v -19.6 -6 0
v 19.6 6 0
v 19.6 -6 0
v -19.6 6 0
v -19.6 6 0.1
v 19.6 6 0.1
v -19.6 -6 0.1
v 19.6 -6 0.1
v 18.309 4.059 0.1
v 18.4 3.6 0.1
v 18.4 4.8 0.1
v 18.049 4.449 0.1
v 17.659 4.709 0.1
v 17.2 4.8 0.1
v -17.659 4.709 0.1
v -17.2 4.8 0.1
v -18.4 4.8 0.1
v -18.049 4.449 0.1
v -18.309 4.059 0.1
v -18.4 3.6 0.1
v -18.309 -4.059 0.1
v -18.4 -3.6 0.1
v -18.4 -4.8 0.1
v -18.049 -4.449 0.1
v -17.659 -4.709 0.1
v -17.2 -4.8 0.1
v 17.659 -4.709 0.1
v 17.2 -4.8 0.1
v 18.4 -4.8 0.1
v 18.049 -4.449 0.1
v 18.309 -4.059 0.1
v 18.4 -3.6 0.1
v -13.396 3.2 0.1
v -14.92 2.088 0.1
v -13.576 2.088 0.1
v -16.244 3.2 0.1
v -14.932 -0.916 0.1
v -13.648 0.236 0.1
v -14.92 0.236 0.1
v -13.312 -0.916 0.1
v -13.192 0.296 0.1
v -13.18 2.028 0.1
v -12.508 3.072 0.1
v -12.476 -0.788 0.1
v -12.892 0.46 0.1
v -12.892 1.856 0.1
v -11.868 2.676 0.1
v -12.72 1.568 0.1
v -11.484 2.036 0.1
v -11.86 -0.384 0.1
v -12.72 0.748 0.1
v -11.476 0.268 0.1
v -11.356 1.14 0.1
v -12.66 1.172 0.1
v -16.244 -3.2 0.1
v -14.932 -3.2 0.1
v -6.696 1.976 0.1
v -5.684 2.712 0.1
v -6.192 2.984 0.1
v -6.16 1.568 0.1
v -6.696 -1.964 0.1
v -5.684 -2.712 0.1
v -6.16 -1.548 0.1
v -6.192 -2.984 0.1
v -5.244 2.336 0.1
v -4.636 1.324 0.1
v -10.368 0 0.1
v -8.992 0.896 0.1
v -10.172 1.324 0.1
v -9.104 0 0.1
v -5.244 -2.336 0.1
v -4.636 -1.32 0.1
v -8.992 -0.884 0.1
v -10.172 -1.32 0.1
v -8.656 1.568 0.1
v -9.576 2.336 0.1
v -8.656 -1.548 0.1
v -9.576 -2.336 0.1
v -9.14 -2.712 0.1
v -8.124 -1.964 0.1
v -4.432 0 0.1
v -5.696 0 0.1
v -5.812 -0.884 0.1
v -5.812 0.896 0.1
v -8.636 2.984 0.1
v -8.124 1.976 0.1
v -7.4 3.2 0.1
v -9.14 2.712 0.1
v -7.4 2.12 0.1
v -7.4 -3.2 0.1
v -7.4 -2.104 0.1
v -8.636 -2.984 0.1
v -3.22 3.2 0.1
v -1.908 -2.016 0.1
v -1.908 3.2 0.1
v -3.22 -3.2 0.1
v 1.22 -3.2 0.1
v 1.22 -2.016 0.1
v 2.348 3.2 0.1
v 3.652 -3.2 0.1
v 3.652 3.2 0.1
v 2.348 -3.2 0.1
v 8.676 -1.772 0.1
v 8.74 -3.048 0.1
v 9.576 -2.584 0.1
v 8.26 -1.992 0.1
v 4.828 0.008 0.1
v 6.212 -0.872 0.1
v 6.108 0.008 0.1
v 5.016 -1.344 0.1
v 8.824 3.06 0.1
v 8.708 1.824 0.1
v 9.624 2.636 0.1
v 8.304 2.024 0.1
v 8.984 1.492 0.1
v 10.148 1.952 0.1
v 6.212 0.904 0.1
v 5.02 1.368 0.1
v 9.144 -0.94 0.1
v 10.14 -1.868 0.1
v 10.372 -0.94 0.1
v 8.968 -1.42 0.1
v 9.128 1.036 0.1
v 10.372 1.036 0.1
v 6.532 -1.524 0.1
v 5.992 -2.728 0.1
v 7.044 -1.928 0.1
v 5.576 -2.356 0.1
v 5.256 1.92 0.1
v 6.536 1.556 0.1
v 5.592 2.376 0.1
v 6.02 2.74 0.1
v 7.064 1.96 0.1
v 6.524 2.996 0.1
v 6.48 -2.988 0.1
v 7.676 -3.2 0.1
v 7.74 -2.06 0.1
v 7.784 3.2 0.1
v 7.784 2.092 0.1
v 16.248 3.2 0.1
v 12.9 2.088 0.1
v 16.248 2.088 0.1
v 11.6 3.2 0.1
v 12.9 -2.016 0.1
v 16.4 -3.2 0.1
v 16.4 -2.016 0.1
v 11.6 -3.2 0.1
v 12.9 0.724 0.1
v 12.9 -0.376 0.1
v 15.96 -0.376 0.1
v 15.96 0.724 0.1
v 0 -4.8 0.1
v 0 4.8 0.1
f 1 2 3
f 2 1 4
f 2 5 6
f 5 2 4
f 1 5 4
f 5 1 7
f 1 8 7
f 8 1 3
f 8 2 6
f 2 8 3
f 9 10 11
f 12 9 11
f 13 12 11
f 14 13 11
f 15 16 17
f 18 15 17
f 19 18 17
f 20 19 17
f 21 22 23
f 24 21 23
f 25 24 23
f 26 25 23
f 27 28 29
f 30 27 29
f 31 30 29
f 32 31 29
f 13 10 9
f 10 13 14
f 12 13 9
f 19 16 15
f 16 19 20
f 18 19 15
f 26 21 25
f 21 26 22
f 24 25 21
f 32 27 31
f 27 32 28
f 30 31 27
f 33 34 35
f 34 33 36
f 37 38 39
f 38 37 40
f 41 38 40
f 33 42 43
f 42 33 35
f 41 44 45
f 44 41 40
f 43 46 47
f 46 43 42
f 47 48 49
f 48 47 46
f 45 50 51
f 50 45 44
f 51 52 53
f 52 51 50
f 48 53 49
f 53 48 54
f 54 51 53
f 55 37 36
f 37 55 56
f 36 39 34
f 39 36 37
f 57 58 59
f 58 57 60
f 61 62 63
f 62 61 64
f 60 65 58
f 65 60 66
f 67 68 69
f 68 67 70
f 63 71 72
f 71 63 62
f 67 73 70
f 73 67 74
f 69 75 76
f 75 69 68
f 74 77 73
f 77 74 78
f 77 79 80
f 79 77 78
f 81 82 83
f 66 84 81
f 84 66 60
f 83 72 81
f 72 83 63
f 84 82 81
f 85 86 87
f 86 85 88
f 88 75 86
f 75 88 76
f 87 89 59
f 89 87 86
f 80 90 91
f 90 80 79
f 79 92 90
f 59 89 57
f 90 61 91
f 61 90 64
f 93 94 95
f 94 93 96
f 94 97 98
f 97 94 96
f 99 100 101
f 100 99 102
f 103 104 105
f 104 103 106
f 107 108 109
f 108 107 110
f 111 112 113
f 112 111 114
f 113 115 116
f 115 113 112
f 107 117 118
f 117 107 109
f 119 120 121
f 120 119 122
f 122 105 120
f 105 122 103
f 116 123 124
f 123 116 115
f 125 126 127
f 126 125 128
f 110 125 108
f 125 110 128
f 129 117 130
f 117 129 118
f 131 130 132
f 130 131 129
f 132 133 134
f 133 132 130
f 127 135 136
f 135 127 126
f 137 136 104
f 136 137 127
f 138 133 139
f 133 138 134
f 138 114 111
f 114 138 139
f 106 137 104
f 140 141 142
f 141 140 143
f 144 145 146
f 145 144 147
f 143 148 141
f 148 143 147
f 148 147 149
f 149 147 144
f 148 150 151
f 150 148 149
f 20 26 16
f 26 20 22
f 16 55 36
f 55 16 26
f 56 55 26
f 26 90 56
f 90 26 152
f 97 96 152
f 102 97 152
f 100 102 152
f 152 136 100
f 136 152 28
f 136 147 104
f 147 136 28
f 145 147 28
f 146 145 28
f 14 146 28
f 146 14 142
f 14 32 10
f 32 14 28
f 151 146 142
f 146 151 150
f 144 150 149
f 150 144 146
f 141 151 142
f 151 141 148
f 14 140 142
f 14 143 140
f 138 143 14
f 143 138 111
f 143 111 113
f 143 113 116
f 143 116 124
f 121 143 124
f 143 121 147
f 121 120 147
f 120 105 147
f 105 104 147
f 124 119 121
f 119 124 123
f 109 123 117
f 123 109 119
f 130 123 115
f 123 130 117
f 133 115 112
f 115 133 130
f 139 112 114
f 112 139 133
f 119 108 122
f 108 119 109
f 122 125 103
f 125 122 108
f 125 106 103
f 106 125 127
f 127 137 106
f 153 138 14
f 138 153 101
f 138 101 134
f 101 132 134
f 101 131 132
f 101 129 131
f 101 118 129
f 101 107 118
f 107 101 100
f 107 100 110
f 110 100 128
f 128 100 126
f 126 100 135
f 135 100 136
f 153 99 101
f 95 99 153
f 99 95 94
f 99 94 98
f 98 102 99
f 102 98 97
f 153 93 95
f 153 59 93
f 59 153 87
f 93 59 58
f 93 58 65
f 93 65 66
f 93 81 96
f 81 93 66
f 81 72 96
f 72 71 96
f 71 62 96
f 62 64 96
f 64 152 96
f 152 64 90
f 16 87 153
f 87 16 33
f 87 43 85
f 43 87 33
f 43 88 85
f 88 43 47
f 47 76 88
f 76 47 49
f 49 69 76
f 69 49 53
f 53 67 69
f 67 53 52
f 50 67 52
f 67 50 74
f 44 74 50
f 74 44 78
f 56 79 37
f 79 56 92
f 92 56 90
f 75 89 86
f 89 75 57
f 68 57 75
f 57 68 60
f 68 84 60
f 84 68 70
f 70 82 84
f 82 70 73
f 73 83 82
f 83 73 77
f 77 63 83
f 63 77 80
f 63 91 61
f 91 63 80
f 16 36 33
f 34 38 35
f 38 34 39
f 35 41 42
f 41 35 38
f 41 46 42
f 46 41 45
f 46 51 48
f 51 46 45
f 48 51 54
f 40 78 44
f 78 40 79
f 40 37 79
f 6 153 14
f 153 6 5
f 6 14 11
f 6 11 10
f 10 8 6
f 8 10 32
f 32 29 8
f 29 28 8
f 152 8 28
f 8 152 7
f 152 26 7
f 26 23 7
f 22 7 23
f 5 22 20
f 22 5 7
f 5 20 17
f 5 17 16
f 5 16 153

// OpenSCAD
// file: ../p/box5-12.scad
use <../lib.scad>
function ldraw_lib__box5_12() = [
// 0 Box with 5 Faces without Any Edges
// 0 Name: box5-12.dat
// 0 Author: Chris Dee [cwdee]
// 0 !LDRAW_ORG Primitive UPDATE 2009-02
// 0 !LICENSE Licensed under CC BY 4.0 : see CAreadme.txt
// 
// 0 BFC CERTIFY CCW
  [0,"BFC","CERTIFY"],
  [0,"BFC","CCW"],
// 
// 0 !HISTORY 2009-09-03 [PTadmin] Official Update 2009-02
// 
// 
// 4 16 1 1 1 1 1 -1 -1 1 -1 -1 1 1
  [4,16,1,1,1,1,1,-1,-1,1,-1,-1,1,1],
// 4 16 -1 0 1 1 0 1 1 1 1 -1 1 1
  [4,16,-1,0,1,1,0,1,1,1,1,-1,1,1],
// 4 16 -1 0 -1 -1 0 1 -1 1 1 -1 1 -1
  [4,16,-1,0,-1,-1,0,1,-1,1,1,-1,1,-1],
// 4 16 1 0 -1 -1 0 -1 -1 1 -1 1 1 -1
  [4,16,1,0,-1,-1,0,-1,-1,1,-1,1,1,-1],
// 4 16 1 0 1 1 0 -1 1 1 -1 1 1 1
  [4,16,1,0,1,1,0,-1,1,1,-1,1,1,1],
// 0
];
module ldraw_lib__box5_12(step=0, col=false, unit=2/5, alt=false, line=0.2, solid=!$preview)
    makepoly(ldraw_lib__box5_12(), step=step, col=col, unit=unit, alt=alt, line=line, solid=solid);
ldraw_lib__box5_12(line=0.2);
// file: ../p/1-4ndis.scad
use <../lib.scad>
function ldraw_lib__1_4ndis() = [
// 0 Disc Negative 0.25
// 0 Name: 1-4ndis.dat
// 0 Author: James Jessiman
// 0 !LDRAW_ORG Primitive UPDATE 2012-01
// 0 !LICENSE Licensed under CC BY 4.0 : see CAreadme.txt
// 
// 0 BFC CERTIFY CCW
  [0,"BFC","CERTIFY"],
  [0,"BFC","CCW"],
// 
// 0 !HISTORY 2002-03-23 [sbliss] Added BFC Statement
// 0 !HISTORY 2002-04-25 [PTadmin] Official Update 2002-02
// 0 !HISTORY 2007-06-22 [PTadmin] Header formatted for Contributor Agreement
// 0 !HISTORY 2008-07-01 [PTadmin] Official Update 2008-01
// 0 !HISTORY 2012-02-16 [Philo] Changed to CCW
// 0 !HISTORY 2012-03-30 [PTadmin] Official Update 2012-01
// 
// 
// 3 16 0.9239 0 0.3827 1 0 0 1 0 1
  [3,16,0.9239,0,0.3827,1,0,0,1,0,1],
// 3 16 0.7071 0 0.7071 0.9239 0 0.3827 1 0 1
  [3,16,0.7071,0,0.7071,0.9239,0,0.3827,1,0,1],
// 3 16 0.3827 0 0.9239 0.7071 0 0.7071 1 0 1
  [3,16,0.3827,0,0.9239,0.7071,0,0.7071,1,0,1],
// 3 16 0 0 1 0.3827 0 0.9239 1 0 1
  [3,16,0,0,1,0.3827,0,0.9239,1,0,1],
];
module ldraw_lib__1_4ndis(step=0, col=false, unit=2/5, alt=false, line=0.2, solid=!$preview)
    makepoly(ldraw_lib__1_4ndis(), step=step, col=col, unit=unit, alt=alt, line=line, solid=solid);
ldraw_lib__1_4ndis(line=0.2);
// file: ../p/1-4chrd.scad
use <../lib.scad>
function ldraw_lib__1_4chrd() = [
// 0 Chord 0.25
// 0 Name: 1-4chrd.dat
// 0 Author: Max Martin Richter [MMR1988]
// 0 !LDRAW_ORG Primitive UPDATE 2023-05
// 0 !LICENSE Licensed under CC BY 4.0 : see CAreadme.txt
// 
// 0 BFC CERTIFY CCW
  [0,"BFC","CERTIFY"],
  [0,"BFC","CCW"],
// 
// 0 !HISTORY 2004-04-22 [PTadmin] Official Update 2004-02
// 0 !HISTORY 2007-10-09 [PTadmin] Header formatted for Contributor Agreement
// 0 !HISTORY 2008-07-01 [PTadmin] Official Update 2008-01
// 0 !HISTORY 2012-08-02 [MMR1988] Re-creation with PrimGen2 and Rectifier
// 0 !HISTORY 2012-08-09 [PTadmin] Official Update 2012-02
// 0 !HISTORY 2023-10-27 [OrionP] Change author to MMR1988 from hafhead
// 0 !HISTORY 2023-10-31 [OrionP] Official Update 2023-05
// 
// 4 16 0.9239 0 0.3827 0.3827 0 0.9239 0 0 1 1 0 0
  [4,16,0.9239,0,0.3827,0.3827,0,0.9239,0,0,1,1,0,0],
// 3 16 0.7071 0 0.7071 0.3827 0 0.9239 0.9239 0 0.3827
  [3,16,0.7071,0,0.7071,0.3827,0,0.9239,0.9239,0,0.3827],
];
module ldraw_lib__1_4chrd(step=0, col=false, unit=2/5, alt=false, line=0.2, solid=!$preview)
    makepoly(ldraw_lib__1_4chrd(), step=step, col=col, unit=unit, alt=alt, line=line, solid=solid);
ldraw_lib__1_4chrd(line=0.2);
// main file
use <../lib.scad>
use <../p/1-4chrd.scad>
use <../p/1-4ndis.scad>
use <../p/box5-12.scad>
function ldraw_lib__196715a() = [
// 0 Sticker  1.5 x  4.9 with White "POLICE" on Blue Rounded Rectangle
// 0 Name: 196715a.dat
// 0 Author: Takeshi Takahashi [RainbowDolphin]
// 0 !LDRAW_ORG Part UPDATE 2025-03
// 0 !LICENSE Licensed under CC BY 4.0 : see CAreadme.txt
// 
// 0 BFC CERTIFY CCW
  [0,"BFC","CERTIFY"],
  [0,"BFC","CCW"],
// 
// 0 !KEYWORDS Battery box, Bricklink 6450stk01, Brickowl 226338, Police car
// 0 !KEYWORDS Rebrickable 196715, Set 6450, truck, van
// 
// 0 !HISTORY 2025-03-30 [OrionP] Official Update 2025-03
// 
// 
// 0 // Font: Swiss 721 BT Bold (Inlined primitives)
// 1 16 0 -0.25 0 49 0 0 0 0.25 0 0 0 15 box5-12.dat
  [1,16,0,-0.25,0,49,0,0,0,0.25,0,0,0,15, ldraw_lib__box5_12()],
// 1 16 43 -0.25 9 3 0 0 0 1 0 0 0 3 1-4ndis.dat
  [1,16,43,-0.25,9,3,0,0,0,1,0,0,0,3, ldraw_lib__1_4ndis()],
// 1 16 -43 -0.25 9 0 0 -3 0 1 0 3 0 0 1-4ndis.dat
  [1,16,-43,-0.25,9,0,0,-3,0,1,0,3,0,0, ldraw_lib__1_4ndis()],
// 1 16 -43 -0.25 -9 -3 0 0 0 1 0 0 0 -3 1-4ndis.dat
  [1,16,-43,-0.25,-9,-3,0,0,0,1,0,0,0,-3, ldraw_lib__1_4ndis()],
// 1 16 43 -0.25 -9 0 0 3 0 1 0 -3 0 0 1-4ndis.dat
  [1,16,43,-0.25,-9,0,0,3,0,1,0,-3,0,0, ldraw_lib__1_4ndis()],
// 0 BFC NOCLIP
  [0,"BFC","NOCLIP"],
// 1 1 43 -0.25 9 3 0 0 0 1 0 0 0 3 1-4chrd.dat
  [1,1,43,-0.25,9,3,0,0,0,1,0,0,0,3, ldraw_lib__1_4chrd()],
// 1 1 -43 -0.25 9 0 0 -3 0 1 0 3 0 0 1-4chrd.dat
  [1,1,-43,-0.25,9,0,0,-3,0,1,0,3,0,0, ldraw_lib__1_4chrd()],
// 1 1 -43 -0.25 -9 -3 0 0 0 1 0 0 0 -3 1-4chrd.dat
  [1,1,-43,-0.25,-9,-3,0,0,0,1,0,0,0,-3, ldraw_lib__1_4chrd()],
// 1 1 43 -0.25 -9 0 0 3 0 1 0 -3 0 0 1-4chrd.dat
  [1,1,43,-0.25,-9,0,0,3,0,1,0,-3,0,0, ldraw_lib__1_4chrd()],
// 4 15 -33.49 -0.25 8 -40.61 -0.25 8 -37.3 -0.25 5.22 -33.94 -0.25 5.22
  [4,15,-33.49,-0.25,8,-40.61,-0.25,8,-37.3,-0.25,5.22,-33.94,-0.25,5.22],
// 4 15 -37.3 -0.25 0.59 -37.33 -0.25 -2.29 -33.28 -0.25 -2.29 -34.12 -0.25 0.59
  [4,15,-37.3,-0.25,0.59,-37.33,-0.25,-2.29,-33.28,-0.25,-2.29,-34.12,-0.25,0.59],
// 3 15 -32.98 -0.25 0.74 -34.12 -0.25 0.59 -33.28 -0.25 -2.29
  [3,15,-32.98,-0.25,0.74,-34.12,-0.25,0.59,-33.28,-0.25,-2.29],
// 4 15 -33.94 -0.25 5.22 -32.95 -0.25 5.07 -31.27 -0.25 7.68 -33.49 -0.25 8
  [4,15,-33.94,-0.25,5.22,-32.95,-0.25,5.07,-31.27,-0.25,7.68,-33.49,-0.25,8],
// 4 15 -33.28 -0.25 -2.29 -31.19 -0.25 -1.97 -32.229 -0.25 1.15 -32.98 -0.25 0.74
  [4,15,-33.28,-0.25,-2.29,-31.19,-0.25,-1.97,-32.229,-0.25,1.15,-32.98,-0.25,0.74],
// 4 15 -32.95 -0.25 5.07 -32.229 -0.25 4.64 -29.67 -0.25 6.69 -31.27 -0.25 7.68
  [4,15,-32.95,-0.25,5.07,-32.229,-0.25,4.64,-29.67,-0.25,6.69,-31.27,-0.25,7.68],
// 4 15 -28.71 -0.25 5.09 -29.67 -0.25 6.69 -32.229 -0.25 4.64 -31.8 -0.25 3.92
  [4,15,-28.71,-0.25,5.09,-29.67,-0.25,6.69,-32.229,-0.25,4.64,-31.8,-0.25,3.92],
// 4 15 -31.19 -0.25 -1.97 -29.65 -0.25 -0.96 -31.8 -0.25 1.87 -32.229 -0.25 1.15
  [4,15,-31.19,-0.25,-1.97,-29.65,-0.25,-0.96,-31.8,-0.25,1.87,-32.229,-0.25,1.15],
// 4 15 -28.39 -0.25 2.85 -31.8 -0.25 1.87 -29.65 -0.25 -0.96 -28.69 -0.25 0.67
  [4,15,-28.39,-0.25,2.85,-31.8,-0.25,1.87,-29.65,-0.25,-0.96,-28.69,-0.25,0.67],
// 4 15 -28.71 -0.25 5.09 -31.8 -0.25 3.92 -31.65 -0.25 2.93 -28.39 -0.25 2.85
  [4,15,-28.71,-0.25,5.09,-31.8,-0.25,3.92,-31.65,-0.25,2.93,-28.39,-0.25,2.85],
// 3 15 -31.65 -0.25 2.93 -31.8 -0.25 1.87 -28.39 -0.25 2.85
  [3,15,-31.65,-0.25,2.93,-31.8,-0.25,1.87,-28.39,-0.25,2.85],
// 4 15 -40.61 -0.25 -8 -37.33 -0.25 -8 -37.33 -0.25 -2.29 -40.61 -0.25 8
  [4,15,-40.61,-0.25,-8,-37.33,-0.25,-8,-37.33,-0.25,-2.29,-40.61,-0.25,8],
// 4 15 -37.3 -0.25 0.59 -37.3 -0.25 5.22 -40.61 -0.25 8 -37.33 -0.25 -2.29
  [4,15,-37.3,-0.25,0.59,-37.3,-0.25,5.22,-40.61,-0.25,8,-37.33,-0.25,-2.29],
// 4 15 -15.4 -0.25 3.92 -14.21 -0.25 6.78 -15.48 -0.25 7.46 -16.74 -0.25 4.94
  [4,15,-15.4,-0.25,3.92,-14.21,-0.25,6.78,-15.48,-0.25,7.46,-16.74,-0.25,4.94],
// 4 15 -15.48 -0.25 -7.46 -14.21 -0.25 -6.78 -15.4 -0.25 -3.87 -16.74 -0.25 -4.91
  [4,15,-15.48,-0.25,-7.46,-14.21,-0.25,-6.78,-15.4,-0.25,-3.87,-16.74,-0.25,-4.91],
// 4 15 -11.59 -0.25 3.31 -13.11 -0.25 5.84 -14.21 -0.25 6.78 -15.4 -0.25 3.92
  [4,15,-11.59,-0.25,3.31,-13.11,-0.25,5.84,-14.21,-0.25,6.78,-15.4,-0.25,3.92],
// 4 15 -25.43 -0.25 3.31 -25.92 -0.25 0 -22.76 -0.25 0 -22.48 -0.25 2.24
  [4,15,-25.43,-0.25,3.31,-25.92,-0.25,0,-22.76,-0.25,0,-22.48,-0.25,2.24],
// 4 15 -11.59 -0.25 -3.3 -15.4 -0.25 -3.87 -14.21 -0.25 -6.78 -13.11 -0.25 -5.84
  [4,15,-11.59,-0.25,-3.3,-15.4,-0.25,-3.87,-14.21,-0.25,-6.78,-13.11,-0.25,-5.84],
// 4 15 -25.43 -0.25 -3.3 -22.48 -0.25 -2.21 -22.76 -0.25 0 -25.92 -0.25 0
  [4,15,-25.43,-0.25,-3.3,-22.48,-0.25,-2.21,-22.76,-0.25,0,-25.92,-0.25,0],
// 4 15 -23.94 -0.25 5.84 -25.43 -0.25 3.31 -22.48 -0.25 2.24 -21.64 -0.25 3.92
  [4,15,-23.94,-0.25,5.84,-25.43,-0.25,3.31,-22.48,-0.25,2.24,-21.64,-0.25,3.92],
// 4 15 -22.48 -0.25 -2.21 -25.43 -0.25 -3.3 -23.94 -0.25 -5.84 -21.64 -0.25 -3.87
  [4,15,-22.48,-0.25,-2.21,-25.43,-0.25,-3.3,-23.94,-0.25,-5.84,-21.64,-0.25,-3.87],
// 4 15 -20.31 -0.25 -4.91 -21.64 -0.25 -3.87 -23.94 -0.25 -5.84 -22.85 -0.25 -6.78
  [4,15,-20.31,-0.25,-4.91,-21.64,-0.25,-3.87,-23.94,-0.25,-5.84,-22.85,-0.25,-6.78],
// 3 15 -11.08 -0.25 0 -14.24 -0.25 0 -14.53 -0.25 -2.21
  [3,15,-11.08,-0.25,0,-14.24,-0.25,0,-14.53,-0.25,-2.21],
// 4 15 -15.4 -0.25 3.92 -14.53 -0.25 2.24 -11.08 -0.25 0 -11.59 -0.25 3.31
  [4,15,-15.4,-0.25,3.92,-14.53,-0.25,2.24,-11.08,-0.25,0,-11.59,-0.25,3.31],
// 4 15 -15.4 -0.25 -3.87 -11.59 -0.25 -3.3 -11.08 -0.25 0 -14.53 -0.25 -2.21
  [4,15,-15.4,-0.25,-3.87,-11.59,-0.25,-3.3,-11.08,-0.25,0,-14.53,-0.25,-2.21],
// 3 15 -14.53 -0.25 2.24 -14.24 -0.25 0 -11.08 -0.25 0
  [3,15,-14.53,-0.25,2.24,-14.24,-0.25,0,-11.08,-0.25,0],
// 4 15 -18.5 -0.25 8 -21.59 -0.25 7.46 -22.85 -0.25 6.78 -20.31 -0.25 4.94
  [4,15,-18.5,-0.25,8,-21.59,-0.25,7.46,-22.85,-0.25,6.78,-20.31,-0.25,4.94],
// 4 15 -23.94 -0.25 5.84 -21.64 -0.25 3.92 -20.31 -0.25 4.94 -22.85 -0.25 6.78
  [4,15,-23.94,-0.25,5.84,-21.64,-0.25,3.92,-20.31,-0.25,4.94,-22.85,-0.25,6.78],
// 4 15 -18.5 -0.25 8 -20.31 -0.25 4.94 -18.5 -0.25 5.3 -15.48 -0.25 7.46
  [4,15,-18.5,-0.25,8,-20.31,-0.25,4.94,-18.5,-0.25,5.3,-15.48,-0.25,7.46],
// 4 15 -18.5 -0.25 -8 -18.5 -0.25 -5.26 -20.31 -0.25 -4.91 -22.85 -0.25 -6.78
  [4,15,-18.5,-0.25,-8,-18.5,-0.25,-5.26,-20.31,-0.25,-4.91,-22.85,-0.25,-6.78],
// 3 15 -22.85 -0.25 -6.78 -21.59 -0.25 -7.46 -18.5 -0.25 -8
  [3,15,-22.85,-0.25,-6.78,-21.59,-0.25,-7.46,-18.5,-0.25,-8],
// 3 15 -15.48 -0.25 7.46 -18.5 -0.25 5.3 -16.74 -0.25 4.94
  [3,15,-15.48,-0.25,7.46,-18.5,-0.25,5.3,-16.74,-0.25,4.94],
// 4 15 -18.5 -0.25 -5.26 -18.5 -0.25 -8 -15.48 -0.25 -7.46 -16.74 -0.25 -4.91
  [4,15,-18.5,-0.25,-5.26,-18.5,-0.25,-8,-15.48,-0.25,-7.46,-16.74,-0.25,-4.91],
// 4 15 -4.77 -0.25 8 -8.05 -0.25 8 -8.05 -0.25 -8 -4.77 -0.25 -5.04
  [4,15,-4.77,-0.25,8,-8.05,-0.25,8,-8.05,-0.25,-8,-4.77,-0.25,-5.04],
// 4 15 3.05 -0.25 -5.04 -4.77 -0.25 -5.04 -8.05 -0.25 -8 3.05 -0.25 -8
  [4,15,3.05,-0.25,-5.04,-4.77,-0.25,-5.04,-8.05,-0.25,-8,3.05,-0.25,-8],
// 4 15 5.87 -0.25 -8 9.13 -0.25 -8 9.13 -0.25 8 5.87 -0.25 8
  [4,15,5.87,-0.25,-8,9.13,-0.25,-8,9.13,-0.25,8,5.87,-0.25,8],
// 4 15 20.65 -0.25 -4.98 21.85 -0.25 -7.62 23.94 -0.25 -6.46 21.69 -0.25 -4.43
  [4,15,20.65,-0.25,-4.98,21.85,-0.25,-7.62,23.94,-0.25,-6.46,21.69,-0.25,-4.43],
// 4 15 15.27 -0.25 0.02 12.07 -0.25 0.02 12.54 -0.25 -3.36 15.53 -0.25 -2.18
  [4,15,15.27,-0.25,0.02,12.07,-0.25,0.02,12.54,-0.25,-3.36,15.53,-0.25,-2.18],
// 4 15 20.76 -0.25 5.06 21.77 -0.25 4.56 24.06 -0.25 6.59 22.06 -0.25 7.65
  [4,15,20.76,-0.25,5.06,21.77,-0.25,4.56,24.06,-0.25,6.59,22.06,-0.25,7.65],
// 4 15 25.37 -0.25 4.88 24.06 -0.25 6.59 21.77 -0.25 4.56 22.46 -0.25 3.73
  [4,15,25.37,-0.25,4.88,24.06,-0.25,6.59,21.77,-0.25,4.56,22.46,-0.25,3.73],
// 4 15 12.55 -0.25 3.42 12.07 -0.25 0.02 15.27 -0.25 0.02 15.53 -0.25 2.26
  [4,15,12.55,-0.25,3.42,12.07,-0.25,0.02,15.27,-0.25,0.02,15.53,-0.25,2.26],
// 4 15 25.93 -0.25 -2.35 22.86 -0.25 -2.35 22.42 -0.25 -3.55 25.35 -0.25 -4.67
  [4,15,25.93,-0.25,-2.35,22.86,-0.25,-2.35,22.42,-0.25,-3.55,25.35,-0.25,-4.67],
// 4 15 21.69 -0.25 -4.43 23.94 -0.25 -6.46 25.35 -0.25 -4.67 22.42 -0.25 -3.55
  [4,15,21.69,-0.25,-4.43,23.94,-0.25,-6.46,25.35,-0.25,-4.67,22.42,-0.25,-3.55],
// 4 15 22.46 -0.25 3.73 22.82 -0.25 2.59 25.93 -0.25 2.59 25.37 -0.25 4.88
  [4,15,22.46,-0.25,3.73,22.82,-0.25,2.59,25.93,-0.25,2.59,25.37,-0.25,4.88],
// 4 15 17.61 -0.25 -4.82 16.329 -0.25 -3.81 13.94 -0.25 -5.89 14.98 -0.25 -6.82
  [4,15,17.61,-0.25,-4.82,16.329,-0.25,-3.81,13.94,-0.25,-5.89,14.98,-0.25,-6.82],
// 4 15 13.94 -0.25 -5.89 16.329 -0.25 -3.81 15.53 -0.25 -2.18 12.54 -0.25 -3.36
  [4,15,13.94,-0.25,-5.89,16.329,-0.25,-3.81,15.53,-0.25,-2.18,12.54,-0.25,-3.36],
// 4 15 12.55 -0.25 3.42 15.53 -0.25 2.26 16.34 -0.25 3.89 13.14 -0.25 4.8
  [4,15,12.55,-0.25,3.42,15.53,-0.25,2.26,16.34,-0.25,3.89,13.14,-0.25,4.8],
// 4 15 13.14 -0.25 4.8 16.34 -0.25 3.89 15.05 -0.25 6.85 13.98 -0.25 5.94
  [4,15,13.14,-0.25,4.8,16.34,-0.25,3.89,15.05,-0.25,6.85,13.98,-0.25,5.94],
// 4 15 16.34 -0.25 3.89 17.66 -0.25 4.9 16.309 -0.25 7.49 15.05 -0.25 6.85
  [4,15,16.34,-0.25,3.89,17.66,-0.25,4.9,16.309,-0.25,7.49,15.05,-0.25,6.85],
// 4 15 14.98 -0.25 -6.82 16.2 -0.25 -7.47 19.19 -0.25 -8 17.61 -0.25 -4.82
  [4,15,14.98,-0.25,-6.82,16.2,-0.25,-7.47,19.19,-0.25,-8,17.61,-0.25,-4.82],
// 4 15 19.35 -0.25 -5.15 17.61 -0.25 -4.82 19.19 -0.25 -8 21.85 -0.25 -7.62
  [4,15,19.35,-0.25,-5.15,17.61,-0.25,-4.82,19.19,-0.25,-8,21.85,-0.25,-7.62],
// 4 15 16.309 -0.25 7.49 17.66 -0.25 4.9 19.46 -0.25 5.23 19.46 -0.25 8
  [4,15,16.309,-0.25,7.49,17.66,-0.25,4.9,19.46,-0.25,5.23,19.46,-0.25,8],
// 4 15 22.06 -0.25 7.65 19.46 -0.25 8 19.46 -0.25 5.23 20.76 -0.25 5.06
  [4,15,22.06,-0.25,7.65,19.46,-0.25,8,19.46,-0.25,5.23,20.76,-0.25,5.06],
// 3 15 20.65 -0.25 -4.98 19.35 -0.25 -5.15 21.85 -0.25 -7.62
  [3,15,20.65,-0.25,-4.98,19.35,-0.25,-5.15,21.85,-0.25,-7.62],
// 4 15 32.25 -0.25 5.22 40.62 -0.25 5.22 40.62 -0.25 8 29 -0.25 8
  [4,15,32.25,-0.25,5.22,40.62,-0.25,5.22,40.62,-0.25,8,29,-0.25,8],
// 4 15 41 -0.25 -5.04 32.25 -0.25 -5.04 29 -0.25 -8 41 -0.25 -8
  [4,15,41,-0.25,-5.04,32.25,-0.25,-5.04,29,-0.25,-8,41,-0.25,-8],
// 4 15 32.25 -0.25 1.81 32.25 -0.25 5.22 29 -0.25 8 29 -0.25 -8
  [4,15,32.25,-0.25,1.81,32.25,-0.25,5.22,29,-0.25,8,29,-0.25,-8],
// 3 15 32.25 -0.25 1.81 29 -0.25 -8 32.25 -0.25 -0.94
  [3,15,32.25,-0.25,1.81,29,-0.25,-8,32.25,-0.25,-0.94],
// 3 15 32.25 -0.25 -0.94 29 -0.25 -8 32.25 -0.25 -5.04
  [3,15,32.25,-0.25,-0.94,29,-0.25,-8,32.25,-0.25,-5.04],
// 4 15 32.25 -0.25 1.81 32.25 -0.25 -0.94 39.9 -0.25 -0.94 39.9 -0.25 1.81
  [4,15,32.25,-0.25,1.81,32.25,-0.25,-0.94,39.9,-0.25,-0.94,39.9,-0.25,1.81],
// 4 1 -43 -0.25 12 -46 -0.25 9 -46 -0.25 -9 -43 -0.25 -12
  [4,1,-43,-0.25,12,-46,-0.25,9,-46,-0.25,-9,-43,-0.25,-12],
// 4 1 -43 -0.25 12 -43 -0.25 -12 -40.61 -0.25 -8 -40.61 -0.25 8
  [4,1,-43,-0.25,12,-43,-0.25,-12,-40.61,-0.25,-8,-40.61,-0.25,8],
// 3 1 -37.33 -0.25 -8 -40.61 -0.25 -8 -43 -0.25 -12
  [3,1,-37.33,-0.25,-8,-40.61,-0.25,-8,-43,-0.25,-12],
// 4 1 -18.5 -0.25 -8 -37.33 -0.25 -8 -43 -0.25 -12 0 -0.25 -12
  [4,1,-18.5,-0.25,-8,-37.33,-0.25,-8,-43,-0.25,-12,0,-0.25,-12],
// 3 1 3.05 -0.25 -8 -8.05 -0.25 -8 0 -0.25 -12
  [3,1,3.05,-0.25,-8,-8.05,-0.25,-8,0,-0.25,-12],
// 3 1 5.87 -0.25 -8 3.05 -0.25 -8 0 -0.25 -12
  [3,1,5.87,-0.25,-8,3.05,-0.25,-8,0,-0.25,-12],
// 3 1 9.13 -0.25 -8 5.87 -0.25 -8 0 -0.25 -12
  [3,1,9.13,-0.25,-8,5.87,-0.25,-8,0,-0.25,-12],
// 4 1 19.19 -0.25 -8 9.13 -0.25 -8 0 -0.25 -12 43 -0.25 -12
  [4,1,19.19,-0.25,-8,9.13,-0.25,-8,0,-0.25,-12,43,-0.25,-12],
// 4 1 19.19 -0.25 -8 43 -0.25 -12 29 -0.25 -8 21.85 -0.25 -7.62
  [4,1,19.19,-0.25,-8,43,-0.25,-12,29,-0.25,-8,21.85,-0.25,-7.62],
// 3 1 41 -0.25 -8 29 -0.25 -8 43 -0.25 -12
  [3,1,41,-0.25,-8,29,-0.25,-8,43,-0.25,-12],
// 3 1 41 -0.25 -5.04 41 -0.25 -8 43 -0.25 -12
  [3,1,41,-0.25,-5.04,41,-0.25,-8,43,-0.25,-12],
// 4 1 40.62 -0.25 5.22 41 -0.25 -5.04 43 -0.25 -12 43 -0.25 12
  [4,1,40.62,-0.25,5.22,41,-0.25,-5.04,43,-0.25,-12,43,-0.25,12],
// 4 1 46 -0.25 9 43 -0.25 12 43 -0.25 -12 46 -0.25 -9
  [4,1,46,-0.25,9,43,-0.25,12,43,-0.25,-12,46,-0.25,-9],
// 4 1 39.9 -0.25 -0.94 41 -0.25 -5.04 40.62 -0.25 5.22 39.9 -0.25 1.81
  [4,1,39.9,-0.25,-0.94,41,-0.25,-5.04,40.62,-0.25,5.22,39.9,-0.25,1.81],
// 4 1 32.25 -0.25 -5.04 41 -0.25 -5.04 39.9 -0.25 -0.94 32.25 -0.25 -0.94
  [4,1,32.25,-0.25,-5.04,41,-0.25,-5.04,39.9,-0.25,-0.94,32.25,-0.25,-0.94],
// 4 1 39.9 -0.25 1.81 40.62 -0.25 5.22 32.25 -0.25 5.22 32.25 -0.25 1.81
  [4,1,39.9,-0.25,1.81,40.62,-0.25,5.22,32.25,-0.25,5.22,32.25,-0.25,1.81],
// 3 1 43 -0.25 12 40.62 -0.25 8 40.62 -0.25 5.22
  [3,1,43,-0.25,12,40.62,-0.25,8,40.62,-0.25,5.22],
// 3 1 43 -0.25 12 29 -0.25 8 40.62 -0.25 8
  [3,1,43,-0.25,12,29,-0.25,8,40.62,-0.25,8],
// 4 1 29 -0.25 8 43 -0.25 12 19.46 -0.25 8 22.06 -0.25 7.65
  [4,1,29,-0.25,8,43,-0.25,12,19.46,-0.25,8,22.06,-0.25,7.65],
// 3 1 29 -0.25 8 22.06 -0.25 7.65 24.06 -0.25 6.59
  [3,1,29,-0.25,8,22.06,-0.25,7.65,24.06,-0.25,6.59],
// 3 1 29 -0.25 8 24.06 -0.25 6.59 25.37 -0.25 4.88
  [3,1,29,-0.25,8,24.06,-0.25,6.59,25.37,-0.25,4.88],
// 3 1 29 -0.25 8 25.37 -0.25 4.88 25.93 -0.25 2.59
  [3,1,29,-0.25,8,25.37,-0.25,4.88,25.93,-0.25,2.59],
// 4 1 29 -0.25 8 25.93 -0.25 2.59 25.93 -0.25 -2.35 29 -0.25 -8
  [4,1,29,-0.25,8,25.93,-0.25,2.59,25.93,-0.25,-2.35,29,-0.25,-8],
// 3 1 25.93 -0.25 -2.35 25.35 -0.25 -4.67 29 -0.25 -8
  [3,1,25.93,-0.25,-2.35,25.35,-0.25,-4.67,29,-0.25,-8],
// 3 1 25.35 -0.25 -4.67 23.94 -0.25 -6.46 29 -0.25 -8
  [3,1,25.35,-0.25,-4.67,23.94,-0.25,-6.46,29,-0.25,-8],
// 3 1 23.94 -0.25 -6.46 21.85 -0.25 -7.62 29 -0.25 -8
  [3,1,23.94,-0.25,-6.46,21.85,-0.25,-7.62,29,-0.25,-8],
// 4 1 22.86 -0.25 -2.35 25.93 -0.25 -2.35 25.93 -0.25 2.59 22.82 -0.25 2.59
  [4,1,22.86,-0.25,-2.35,25.93,-0.25,-2.35,25.93,-0.25,2.59,22.82,-0.25,2.59],
// 4 1 15.27 -0.25 0.02 22.86 -0.25 -2.35 22.82 -0.25 2.59 15.53 -0.25 2.26
  [4,1,15.27,-0.25,0.02,22.86,-0.25,-2.35,22.82,-0.25,2.59,15.53,-0.25,2.26],
// 4 1 15.53 -0.25 2.26 22.82 -0.25 2.59 22.46 -0.25 3.73 16.34 -0.25 3.89
  [4,1,15.53,-0.25,2.26,22.82,-0.25,2.59,22.46,-0.25,3.73,16.34,-0.25,3.89],
// 4 1 16.34 -0.25 3.89 22.46 -0.25 3.73 21.77 -0.25 4.56 17.66 -0.25 4.9
  [4,1,16.34,-0.25,3.89,22.46,-0.25,3.73,21.77,-0.25,4.56,17.66,-0.25,4.9],
// 4 1 17.66 -0.25 4.9 21.77 -0.25 4.56 20.76 -0.25 5.06 19.46 -0.25 5.23
  [4,1,17.66,-0.25,4.9,21.77,-0.25,4.56,20.76,-0.25,5.06,19.46,-0.25,5.23],
// 4 1 22.86 -0.25 -2.35 15.27 -0.25 0.02 15.53 -0.25 -2.18 22.42 -0.25 -3.55
  [4,1,22.86,-0.25,-2.35,15.27,-0.25,0.02,15.53,-0.25,-2.18,22.42,-0.25,-3.55],
// 4 1 22.42 -0.25 -3.55 15.53 -0.25 -2.18 16.329 -0.25 -3.81 21.69 -0.25 -4.43
  [4,1,22.42,-0.25,-3.55,15.53,-0.25,-2.18,16.329,-0.25,-3.81,21.69,-0.25,-4.43],
// 4 1 21.69 -0.25 -4.43 16.329 -0.25 -3.81 17.61 -0.25 -4.82 20.65 -0.25 -4.98
  [4,1,21.69,-0.25,-4.43,16.329,-0.25,-3.81,17.61,-0.25,-4.82,20.65,-0.25,-4.98],
// 3 1 17.61 -0.25 -4.82 19.35 -0.25 -5.15 20.65 -0.25 -4.98
  [3,1,17.61,-0.25,-4.82,19.35,-0.25,-5.15,20.65,-0.25,-4.98],
// 4 1 19.46 -0.25 8 43 -0.25 12 0 -0.25 12 9.13 -0.25 8
  [4,1,19.46,-0.25,8,43,-0.25,12,0,-0.25,12,9.13,-0.25,8],
// 3 1 19.46 -0.25 8 9.13 -0.25 8 16.309 -0.25 7.49
  [3,1,19.46,-0.25,8,9.13,-0.25,8,16.309,-0.25,7.49],
// 3 1 9.13 -0.25 8 15.05 -0.25 6.85 16.309 -0.25 7.49
  [3,1,9.13,-0.25,8,15.05,-0.25,6.85,16.309,-0.25,7.49],
// 3 1 9.13 -0.25 8 13.98 -0.25 5.94 15.05 -0.25 6.85
  [3,1,9.13,-0.25,8,13.98,-0.25,5.94,15.05,-0.25,6.85],
// 3 1 9.13 -0.25 8 13.14 -0.25 4.8 13.98 -0.25 5.94
  [3,1,9.13,-0.25,8,13.14,-0.25,4.8,13.98,-0.25,5.94],
// 3 1 9.13 -0.25 8 12.55 -0.25 3.42 13.14 -0.25 4.8
  [3,1,9.13,-0.25,8,12.55,-0.25,3.42,13.14,-0.25,4.8],
// 4 1 12.07 -0.25 0.02 12.55 -0.25 3.42 9.13 -0.25 8 9.13 -0.25 -8
  [4,1,12.07,-0.25,0.02,12.55,-0.25,3.42,9.13,-0.25,8,9.13,-0.25,-8],
// 3 1 12.07 -0.25 0.02 9.13 -0.25 -8 12.54 -0.25 -3.36
  [3,1,12.07,-0.25,0.02,9.13,-0.25,-8,12.54,-0.25,-3.36],
// 3 1 12.54 -0.25 -3.36 9.13 -0.25 -8 13.94 -0.25 -5.89
  [3,1,12.54,-0.25,-3.36,9.13,-0.25,-8,13.94,-0.25,-5.89],
// 3 1 13.94 -0.25 -5.89 9.13 -0.25 -8 14.98 -0.25 -6.82
  [3,1,13.94,-0.25,-5.89,9.13,-0.25,-8,14.98,-0.25,-6.82],
// 3 1 14.98 -0.25 -6.82 9.13 -0.25 -8 16.2 -0.25 -7.47
  [3,1,14.98,-0.25,-6.82,9.13,-0.25,-8,16.2,-0.25,-7.47],
// 3 1 16.2 -0.25 -7.47 9.13 -0.25 -8 19.19 -0.25 -8
  [3,1,16.2,-0.25,-7.47,9.13,-0.25,-8,19.19,-0.25,-8],
// 3 1 0 -0.25 12 5.87 -0.25 8 9.13 -0.25 8
  [3,1,0,-0.25,12,5.87,-0.25,8,9.13,-0.25,8],
// 4 1 5.87 -0.25 8 0 -0.25 12 -4.77 -0.25 8 -4.77 -0.25 -5.04
  [4,1,5.87,-0.25,8,0,-0.25,12,-4.77,-0.25,8,-4.77,-0.25,-5.04],
// 3 1 5.87 -0.25 8 -4.77 -0.25 -5.04 3.05 -0.25 -5.04
  [3,1,5.87,-0.25,8,-4.77,-0.25,-5.04,3.05,-0.25,-5.04],
// 4 1 5.87 -0.25 -8 5.87 -0.25 8 3.05 -0.25 -5.04 3.05 -0.25 -8
  [4,1,5.87,-0.25,-8,5.87,-0.25,8,3.05,-0.25,-5.04,3.05,-0.25,-8],
// 3 1 0 -0.25 12 -8.05 -0.25 8 -4.77 -0.25 8
  [3,1,0,-0.25,12,-8.05,-0.25,8,-4.77,-0.25,8],
// 4 1 -8.05 -0.25 8 0 -0.25 12 -18.5 -0.25 8 -15.48 -0.25 7.46
  [4,1,-8.05,-0.25,8,0,-0.25,12,-18.5,-0.25,8,-15.48,-0.25,7.46],
// 3 1 -8.05 -0.25 8 -15.48 -0.25 7.46 -14.21 -0.25 6.78
  [3,1,-8.05,-0.25,8,-15.48,-0.25,7.46,-14.21,-0.25,6.78],
// 3 1 -8.05 -0.25 8 -14.21 -0.25 6.78 -13.11 -0.25 5.84
  [3,1,-8.05,-0.25,8,-14.21,-0.25,6.78,-13.11,-0.25,5.84],
// 3 1 -8.05 -0.25 8 -13.11 -0.25 5.84 -11.59 -0.25 3.31
  [3,1,-8.05,-0.25,8,-13.11,-0.25,5.84,-11.59,-0.25,3.31],
// 4 1 -8.05 -0.25 8 -11.59 -0.25 3.31 -11.08 -0.25 0 -8.05 -0.25 -8
  [4,1,-8.05,-0.25,8,-11.59,-0.25,3.31,-11.08,-0.25,0,-8.05,-0.25,-8],
// 3 1 -11.08 -0.25 0 -11.59 -0.25 -3.3 -8.05 -0.25 -8
  [3,1,-11.08,-0.25,0,-11.59,-0.25,-3.3,-8.05,-0.25,-8],
// 3 1 -11.59 -0.25 -3.3 -13.11 -0.25 -5.84 -8.05 -0.25 -8
  [3,1,-11.59,-0.25,-3.3,-13.11,-0.25,-5.84,-8.05,-0.25,-8],
// 3 1 -13.11 -0.25 -5.84 -14.21 -0.25 -6.78 -8.05 -0.25 -8
  [3,1,-13.11,-0.25,-5.84,-14.21,-0.25,-6.78,-8.05,-0.25,-8],
// 3 1 -14.21 -0.25 -6.78 -15.48 -0.25 -7.46 -8.05 -0.25 -8
  [3,1,-14.21,-0.25,-6.78,-15.48,-0.25,-7.46,-8.05,-0.25,-8],
// 4 1 -8.05 -0.25 -8 -15.48 -0.25 -7.46 -18.5 -0.25 -8 0 -0.25 -12
  [4,1,-8.05,-0.25,-8,-15.48,-0.25,-7.46,-18.5,-0.25,-8,0,-0.25,-12],
// 4 1 -18.5 -0.25 8 0 -0.25 12 -43 -0.25 12 -33.49 -0.25 8
  [4,1,-18.5,-0.25,8,0,-0.25,12,-43,-0.25,12,-33.49,-0.25,8],
// 4 1 -18.5 -0.25 8 -33.49 -0.25 8 -31.27 -0.25 7.68 -21.59 -0.25 7.46
  [4,1,-18.5,-0.25,8,-33.49,-0.25,8,-31.27,-0.25,7.68,-21.59,-0.25,7.46],
// 4 1 -21.59 -0.25 7.46 -31.27 -0.25 7.68 -29.67 -0.25 6.69 -22.85 -0.25 6.78
  [4,1,-21.59,-0.25,7.46,-31.27,-0.25,7.68,-29.67,-0.25,6.69,-22.85,-0.25,6.78],
// 4 1 -22.85 -0.25 6.78 -29.67 -0.25 6.69 -28.71 -0.25 5.09 -23.94 -0.25 5.84
  [4,1,-22.85,-0.25,6.78,-29.67,-0.25,6.69,-28.71,-0.25,5.09,-23.94,-0.25,5.84],
// 4 1 -23.94 -0.25 5.84 -28.71 -0.25 5.09 -28.39 -0.25 2.85 -25.43 -0.25 3.31
  [4,1,-23.94,-0.25,5.84,-28.71,-0.25,5.09,-28.39,-0.25,2.85,-25.43,-0.25,3.31],
// 4 1 -25.43 -0.25 3.31 -28.39 -0.25 2.85 -28.69 -0.25 0.67 -25.92 -0.25 0
  [4,1,-25.43,-0.25,3.31,-28.39,-0.25,2.85,-28.69,-0.25,0.67,-25.92,-0.25,0],
// 4 1 -25.92 -0.25 0 -28.69 -0.25 0.67 -29.65 -0.25 -0.96 -25.43 -0.25 -3.3
  [4,1,-25.92,-0.25,0,-28.69,-0.25,0.67,-29.65,-0.25,-0.96,-25.43,-0.25,-3.3],
// 4 1 -25.43 -0.25 -3.3 -29.65 -0.25 -0.96 -31.19 -0.25 -1.97 -23.94 -0.25 -5.84
  [4,1,-25.43,-0.25,-3.3,-29.65,-0.25,-0.96,-31.19,-0.25,-1.97,-23.94,-0.25,-5.84],
// 4 1 -21.59 -0.25 -7.46 -22.85 -0.25 -6.78 -37.33 -0.25 -2.29 -37.33 -0.25 -8
  [4,1,-21.59,-0.25,-7.46,-22.85,-0.25,-6.78,-37.33,-0.25,-2.29,-37.33,-0.25,-8],
// 3 1 -21.59 -0.25 -7.46 -37.33 -0.25 -8 -18.5 -0.25 -8
  [3,1,-21.59,-0.25,-7.46,-37.33,-0.25,-8,-18.5,-0.25,-8],
// 4 1 -16.74 -0.25 4.94 -18.5 -0.25 5.3 -20.31 -0.25 4.94 -21.64 -0.25 3.92
  [4,1,-16.74,-0.25,4.94,-18.5,-0.25,5.3,-20.31,-0.25,4.94,-21.64,-0.25,3.92],
// 4 1 -15.4 -0.25 3.92 -16.74 -0.25 4.94 -21.64 -0.25 3.92 -22.48 -0.25 2.24
  [4,1,-15.4,-0.25,3.92,-16.74,-0.25,4.94,-21.64,-0.25,3.92,-22.48,-0.25,2.24],
// 4 1 -14.53 -0.25 2.24 -15.4 -0.25 3.92 -22.48 -0.25 2.24 -22.76 -0.25 0
  [4,1,-14.53,-0.25,2.24,-15.4,-0.25,3.92,-22.48,-0.25,2.24,-22.76,-0.25,0],
// 4 1 -14.24 -0.25 0 -14.53 -0.25 2.24 -22.76 -0.25 0 -22.48 -0.25 -2.21
  [4,1,-14.24,-0.25,0,-14.53,-0.25,2.24,-22.76,-0.25,0,-22.48,-0.25,-2.21],
// 4 1 -14.53 -0.25 -2.21 -14.24 -0.25 0 -22.48 -0.25 -2.21 -21.64 -0.25 -3.87
  [4,1,-14.53,-0.25,-2.21,-14.24,-0.25,0,-22.48,-0.25,-2.21,-21.64,-0.25,-3.87],
// 4 1 -15.4 -0.25 -3.87 -14.53 -0.25 -2.21 -21.64 -0.25 -3.87 -20.31 -0.25 -4.91
  [4,1,-15.4,-0.25,-3.87,-14.53,-0.25,-2.21,-21.64,-0.25,-3.87,-20.31,-0.25,-4.91],
// 4 1 -16.74 -0.25 -4.91 -15.4 -0.25 -3.87 -20.31 -0.25 -4.91 -18.5 -0.25 -5.26
  [4,1,-16.74,-0.25,-4.91,-15.4,-0.25,-3.87,-20.31,-0.25,-4.91,-18.5,-0.25,-5.26],
// 3 1 -43 -0.25 12 -40.61 -0.25 8 -33.49 -0.25 8
  [3,1,-43,-0.25,12,-40.61,-0.25,8,-33.49,-0.25,8],
// 4 1 -33.94 -0.25 5.22 -37.3 -0.25 5.22 -37.3 -0.25 0.59 -34.12 -0.25 0.59
  [4,1,-33.94,-0.25,5.22,-37.3,-0.25,5.22,-37.3,-0.25,0.59,-34.12,-0.25,0.59],
// 4 1 -32.95 -0.25 5.07 -33.94 -0.25 5.22 -34.12 -0.25 0.59 -32.98 -0.25 0.74
  [4,1,-32.95,-0.25,5.07,-33.94,-0.25,5.22,-34.12,-0.25,0.59,-32.98,-0.25,0.74],
// 4 1 -32.229 -0.25 4.64 -32.95 -0.25 5.07 -32.98 -0.25 0.74 -32.229 -0.25 1.15
  [4,1,-32.229,-0.25,4.64,-32.95,-0.25,5.07,-32.98,-0.25,0.74,-32.229,-0.25,1.15],
// 4 1 -31.8 -0.25 3.92 -32.229 -0.25 4.64 -32.229 -0.25 1.15 -31.8 -0.25 1.87
  [4,1,-31.8,-0.25,3.92,-32.229,-0.25,4.64,-32.229,-0.25,1.15,-31.8,-0.25,1.87],
// 3 1 -31.8 -0.25 3.92 -31.8 -0.25 1.87 -31.65 -0.25 2.93
  [3,1,-31.8,-0.25,3.92,-31.8,-0.25,1.87,-31.65,-0.25,2.93],
// 4 1 -23.94 -0.25 -5.84 -31.19 -0.25 -1.97 -33.28 -0.25 -2.29 -22.85 -0.25 -6.78
  [4,1,-23.94,-0.25,-5.84,-31.19,-0.25,-1.97,-33.28,-0.25,-2.29,-22.85,-0.25,-6.78],
// 3 1 -33.28 -0.25 -2.29 -37.33 -0.25 -2.29 -22.85 -0.25 -6.78
  [3,1,-33.28,-0.25,-2.29,-37.33,-0.25,-2.29,-22.85,-0.25,-6.78],
// 0 BFC CLIP
  [0,"BFC","CLIP"],
// 4 16 49 -0.25 15 -49 -0.25 15 0 -0.25 12 43 -0.25 12
  [4,16,49,-0.25,15,-49,-0.25,15,0,-0.25,12,43,-0.25,12],
// 3 16 49 -0.25 15 43 -0.25 12 46 -0.25 12
  [3,16,49,-0.25,15,43,-0.25,12,46,-0.25,12],
// 3 16 49 -0.25 15 46 -0.25 12 46 -0.25 9
  [3,16,49,-0.25,15,46,-0.25,12,46,-0.25,9],
// 4 16 49 -0.25 15 46 -0.25 9 46 -0.25 -9 49 -0.25 -15
  [4,16,49,-0.25,15,46,-0.25,9,46,-0.25,-9,49,-0.25,-15],
// 3 16 46 -0.25 -9 46 -0.25 -12 49 -0.25 -15
  [3,16,46,-0.25,-9,46,-0.25,-12,49,-0.25,-15],
// 3 16 46 -0.25 -12 43 -0.25 -12 49 -0.25 -15
  [3,16,46,-0.25,-12,43,-0.25,-12,49,-0.25,-15],
// 4 16 49 -0.25 -15 43 -0.25 -12 0 -0.25 -12 -49 -0.25 -15
  [4,16,49,-0.25,-15,43,-0.25,-12,0,-0.25,-12,-49,-0.25,-15],
// 3 16 0 -0.25 -12 -43 -0.25 -12 -49 -0.25 -15
  [3,16,0,-0.25,-12,-43,-0.25,-12,-49,-0.25,-15],
// 3 16 -43 -0.25 -12 -46 -0.25 -12 -49 -0.25 -15
  [3,16,-43,-0.25,-12,-46,-0.25,-12,-49,-0.25,-15],
// 3 16 -46 -0.25 -9 -49 -0.25 -15 -46 -0.25 -12
  [3,16,-46,-0.25,-9,-49,-0.25,-15,-46,-0.25,-12],
// 4 16 -49 -0.25 -15 -46 -0.25 -9 -46 -0.25 9 -49 -0.25 15
  [4,16,-49,-0.25,-15,-46,-0.25,-9,-46,-0.25,9,-49,-0.25,15],
// 3 16 -49 -0.25 15 -46 -0.25 9 -46 -0.25 12
  [3,16,-49,-0.25,15,-46,-0.25,9,-46,-0.25,12],
// 3 16 -49 -0.25 15 -46 -0.25 12 -43 -0.25 12
  [3,16,-49,-0.25,15,-46,-0.25,12,-43,-0.25,12],
// 3 16 -49 -0.25 15 -43 -0.25 12 0 -0.25 12
  [3,16,-49,-0.25,15,-43,-0.25,12,0,-0.25,12],
];
module ldraw_lib__196715a(step=0, col=false, unit=2/5, alt=false, line=0.2, solid=!$preview)
    makepoly(ldraw_lib__196715a(), step=step, col=col, unit=unit, alt=alt, line=line, solid=solid);
ldraw_lib__196715a(line=0.2);
